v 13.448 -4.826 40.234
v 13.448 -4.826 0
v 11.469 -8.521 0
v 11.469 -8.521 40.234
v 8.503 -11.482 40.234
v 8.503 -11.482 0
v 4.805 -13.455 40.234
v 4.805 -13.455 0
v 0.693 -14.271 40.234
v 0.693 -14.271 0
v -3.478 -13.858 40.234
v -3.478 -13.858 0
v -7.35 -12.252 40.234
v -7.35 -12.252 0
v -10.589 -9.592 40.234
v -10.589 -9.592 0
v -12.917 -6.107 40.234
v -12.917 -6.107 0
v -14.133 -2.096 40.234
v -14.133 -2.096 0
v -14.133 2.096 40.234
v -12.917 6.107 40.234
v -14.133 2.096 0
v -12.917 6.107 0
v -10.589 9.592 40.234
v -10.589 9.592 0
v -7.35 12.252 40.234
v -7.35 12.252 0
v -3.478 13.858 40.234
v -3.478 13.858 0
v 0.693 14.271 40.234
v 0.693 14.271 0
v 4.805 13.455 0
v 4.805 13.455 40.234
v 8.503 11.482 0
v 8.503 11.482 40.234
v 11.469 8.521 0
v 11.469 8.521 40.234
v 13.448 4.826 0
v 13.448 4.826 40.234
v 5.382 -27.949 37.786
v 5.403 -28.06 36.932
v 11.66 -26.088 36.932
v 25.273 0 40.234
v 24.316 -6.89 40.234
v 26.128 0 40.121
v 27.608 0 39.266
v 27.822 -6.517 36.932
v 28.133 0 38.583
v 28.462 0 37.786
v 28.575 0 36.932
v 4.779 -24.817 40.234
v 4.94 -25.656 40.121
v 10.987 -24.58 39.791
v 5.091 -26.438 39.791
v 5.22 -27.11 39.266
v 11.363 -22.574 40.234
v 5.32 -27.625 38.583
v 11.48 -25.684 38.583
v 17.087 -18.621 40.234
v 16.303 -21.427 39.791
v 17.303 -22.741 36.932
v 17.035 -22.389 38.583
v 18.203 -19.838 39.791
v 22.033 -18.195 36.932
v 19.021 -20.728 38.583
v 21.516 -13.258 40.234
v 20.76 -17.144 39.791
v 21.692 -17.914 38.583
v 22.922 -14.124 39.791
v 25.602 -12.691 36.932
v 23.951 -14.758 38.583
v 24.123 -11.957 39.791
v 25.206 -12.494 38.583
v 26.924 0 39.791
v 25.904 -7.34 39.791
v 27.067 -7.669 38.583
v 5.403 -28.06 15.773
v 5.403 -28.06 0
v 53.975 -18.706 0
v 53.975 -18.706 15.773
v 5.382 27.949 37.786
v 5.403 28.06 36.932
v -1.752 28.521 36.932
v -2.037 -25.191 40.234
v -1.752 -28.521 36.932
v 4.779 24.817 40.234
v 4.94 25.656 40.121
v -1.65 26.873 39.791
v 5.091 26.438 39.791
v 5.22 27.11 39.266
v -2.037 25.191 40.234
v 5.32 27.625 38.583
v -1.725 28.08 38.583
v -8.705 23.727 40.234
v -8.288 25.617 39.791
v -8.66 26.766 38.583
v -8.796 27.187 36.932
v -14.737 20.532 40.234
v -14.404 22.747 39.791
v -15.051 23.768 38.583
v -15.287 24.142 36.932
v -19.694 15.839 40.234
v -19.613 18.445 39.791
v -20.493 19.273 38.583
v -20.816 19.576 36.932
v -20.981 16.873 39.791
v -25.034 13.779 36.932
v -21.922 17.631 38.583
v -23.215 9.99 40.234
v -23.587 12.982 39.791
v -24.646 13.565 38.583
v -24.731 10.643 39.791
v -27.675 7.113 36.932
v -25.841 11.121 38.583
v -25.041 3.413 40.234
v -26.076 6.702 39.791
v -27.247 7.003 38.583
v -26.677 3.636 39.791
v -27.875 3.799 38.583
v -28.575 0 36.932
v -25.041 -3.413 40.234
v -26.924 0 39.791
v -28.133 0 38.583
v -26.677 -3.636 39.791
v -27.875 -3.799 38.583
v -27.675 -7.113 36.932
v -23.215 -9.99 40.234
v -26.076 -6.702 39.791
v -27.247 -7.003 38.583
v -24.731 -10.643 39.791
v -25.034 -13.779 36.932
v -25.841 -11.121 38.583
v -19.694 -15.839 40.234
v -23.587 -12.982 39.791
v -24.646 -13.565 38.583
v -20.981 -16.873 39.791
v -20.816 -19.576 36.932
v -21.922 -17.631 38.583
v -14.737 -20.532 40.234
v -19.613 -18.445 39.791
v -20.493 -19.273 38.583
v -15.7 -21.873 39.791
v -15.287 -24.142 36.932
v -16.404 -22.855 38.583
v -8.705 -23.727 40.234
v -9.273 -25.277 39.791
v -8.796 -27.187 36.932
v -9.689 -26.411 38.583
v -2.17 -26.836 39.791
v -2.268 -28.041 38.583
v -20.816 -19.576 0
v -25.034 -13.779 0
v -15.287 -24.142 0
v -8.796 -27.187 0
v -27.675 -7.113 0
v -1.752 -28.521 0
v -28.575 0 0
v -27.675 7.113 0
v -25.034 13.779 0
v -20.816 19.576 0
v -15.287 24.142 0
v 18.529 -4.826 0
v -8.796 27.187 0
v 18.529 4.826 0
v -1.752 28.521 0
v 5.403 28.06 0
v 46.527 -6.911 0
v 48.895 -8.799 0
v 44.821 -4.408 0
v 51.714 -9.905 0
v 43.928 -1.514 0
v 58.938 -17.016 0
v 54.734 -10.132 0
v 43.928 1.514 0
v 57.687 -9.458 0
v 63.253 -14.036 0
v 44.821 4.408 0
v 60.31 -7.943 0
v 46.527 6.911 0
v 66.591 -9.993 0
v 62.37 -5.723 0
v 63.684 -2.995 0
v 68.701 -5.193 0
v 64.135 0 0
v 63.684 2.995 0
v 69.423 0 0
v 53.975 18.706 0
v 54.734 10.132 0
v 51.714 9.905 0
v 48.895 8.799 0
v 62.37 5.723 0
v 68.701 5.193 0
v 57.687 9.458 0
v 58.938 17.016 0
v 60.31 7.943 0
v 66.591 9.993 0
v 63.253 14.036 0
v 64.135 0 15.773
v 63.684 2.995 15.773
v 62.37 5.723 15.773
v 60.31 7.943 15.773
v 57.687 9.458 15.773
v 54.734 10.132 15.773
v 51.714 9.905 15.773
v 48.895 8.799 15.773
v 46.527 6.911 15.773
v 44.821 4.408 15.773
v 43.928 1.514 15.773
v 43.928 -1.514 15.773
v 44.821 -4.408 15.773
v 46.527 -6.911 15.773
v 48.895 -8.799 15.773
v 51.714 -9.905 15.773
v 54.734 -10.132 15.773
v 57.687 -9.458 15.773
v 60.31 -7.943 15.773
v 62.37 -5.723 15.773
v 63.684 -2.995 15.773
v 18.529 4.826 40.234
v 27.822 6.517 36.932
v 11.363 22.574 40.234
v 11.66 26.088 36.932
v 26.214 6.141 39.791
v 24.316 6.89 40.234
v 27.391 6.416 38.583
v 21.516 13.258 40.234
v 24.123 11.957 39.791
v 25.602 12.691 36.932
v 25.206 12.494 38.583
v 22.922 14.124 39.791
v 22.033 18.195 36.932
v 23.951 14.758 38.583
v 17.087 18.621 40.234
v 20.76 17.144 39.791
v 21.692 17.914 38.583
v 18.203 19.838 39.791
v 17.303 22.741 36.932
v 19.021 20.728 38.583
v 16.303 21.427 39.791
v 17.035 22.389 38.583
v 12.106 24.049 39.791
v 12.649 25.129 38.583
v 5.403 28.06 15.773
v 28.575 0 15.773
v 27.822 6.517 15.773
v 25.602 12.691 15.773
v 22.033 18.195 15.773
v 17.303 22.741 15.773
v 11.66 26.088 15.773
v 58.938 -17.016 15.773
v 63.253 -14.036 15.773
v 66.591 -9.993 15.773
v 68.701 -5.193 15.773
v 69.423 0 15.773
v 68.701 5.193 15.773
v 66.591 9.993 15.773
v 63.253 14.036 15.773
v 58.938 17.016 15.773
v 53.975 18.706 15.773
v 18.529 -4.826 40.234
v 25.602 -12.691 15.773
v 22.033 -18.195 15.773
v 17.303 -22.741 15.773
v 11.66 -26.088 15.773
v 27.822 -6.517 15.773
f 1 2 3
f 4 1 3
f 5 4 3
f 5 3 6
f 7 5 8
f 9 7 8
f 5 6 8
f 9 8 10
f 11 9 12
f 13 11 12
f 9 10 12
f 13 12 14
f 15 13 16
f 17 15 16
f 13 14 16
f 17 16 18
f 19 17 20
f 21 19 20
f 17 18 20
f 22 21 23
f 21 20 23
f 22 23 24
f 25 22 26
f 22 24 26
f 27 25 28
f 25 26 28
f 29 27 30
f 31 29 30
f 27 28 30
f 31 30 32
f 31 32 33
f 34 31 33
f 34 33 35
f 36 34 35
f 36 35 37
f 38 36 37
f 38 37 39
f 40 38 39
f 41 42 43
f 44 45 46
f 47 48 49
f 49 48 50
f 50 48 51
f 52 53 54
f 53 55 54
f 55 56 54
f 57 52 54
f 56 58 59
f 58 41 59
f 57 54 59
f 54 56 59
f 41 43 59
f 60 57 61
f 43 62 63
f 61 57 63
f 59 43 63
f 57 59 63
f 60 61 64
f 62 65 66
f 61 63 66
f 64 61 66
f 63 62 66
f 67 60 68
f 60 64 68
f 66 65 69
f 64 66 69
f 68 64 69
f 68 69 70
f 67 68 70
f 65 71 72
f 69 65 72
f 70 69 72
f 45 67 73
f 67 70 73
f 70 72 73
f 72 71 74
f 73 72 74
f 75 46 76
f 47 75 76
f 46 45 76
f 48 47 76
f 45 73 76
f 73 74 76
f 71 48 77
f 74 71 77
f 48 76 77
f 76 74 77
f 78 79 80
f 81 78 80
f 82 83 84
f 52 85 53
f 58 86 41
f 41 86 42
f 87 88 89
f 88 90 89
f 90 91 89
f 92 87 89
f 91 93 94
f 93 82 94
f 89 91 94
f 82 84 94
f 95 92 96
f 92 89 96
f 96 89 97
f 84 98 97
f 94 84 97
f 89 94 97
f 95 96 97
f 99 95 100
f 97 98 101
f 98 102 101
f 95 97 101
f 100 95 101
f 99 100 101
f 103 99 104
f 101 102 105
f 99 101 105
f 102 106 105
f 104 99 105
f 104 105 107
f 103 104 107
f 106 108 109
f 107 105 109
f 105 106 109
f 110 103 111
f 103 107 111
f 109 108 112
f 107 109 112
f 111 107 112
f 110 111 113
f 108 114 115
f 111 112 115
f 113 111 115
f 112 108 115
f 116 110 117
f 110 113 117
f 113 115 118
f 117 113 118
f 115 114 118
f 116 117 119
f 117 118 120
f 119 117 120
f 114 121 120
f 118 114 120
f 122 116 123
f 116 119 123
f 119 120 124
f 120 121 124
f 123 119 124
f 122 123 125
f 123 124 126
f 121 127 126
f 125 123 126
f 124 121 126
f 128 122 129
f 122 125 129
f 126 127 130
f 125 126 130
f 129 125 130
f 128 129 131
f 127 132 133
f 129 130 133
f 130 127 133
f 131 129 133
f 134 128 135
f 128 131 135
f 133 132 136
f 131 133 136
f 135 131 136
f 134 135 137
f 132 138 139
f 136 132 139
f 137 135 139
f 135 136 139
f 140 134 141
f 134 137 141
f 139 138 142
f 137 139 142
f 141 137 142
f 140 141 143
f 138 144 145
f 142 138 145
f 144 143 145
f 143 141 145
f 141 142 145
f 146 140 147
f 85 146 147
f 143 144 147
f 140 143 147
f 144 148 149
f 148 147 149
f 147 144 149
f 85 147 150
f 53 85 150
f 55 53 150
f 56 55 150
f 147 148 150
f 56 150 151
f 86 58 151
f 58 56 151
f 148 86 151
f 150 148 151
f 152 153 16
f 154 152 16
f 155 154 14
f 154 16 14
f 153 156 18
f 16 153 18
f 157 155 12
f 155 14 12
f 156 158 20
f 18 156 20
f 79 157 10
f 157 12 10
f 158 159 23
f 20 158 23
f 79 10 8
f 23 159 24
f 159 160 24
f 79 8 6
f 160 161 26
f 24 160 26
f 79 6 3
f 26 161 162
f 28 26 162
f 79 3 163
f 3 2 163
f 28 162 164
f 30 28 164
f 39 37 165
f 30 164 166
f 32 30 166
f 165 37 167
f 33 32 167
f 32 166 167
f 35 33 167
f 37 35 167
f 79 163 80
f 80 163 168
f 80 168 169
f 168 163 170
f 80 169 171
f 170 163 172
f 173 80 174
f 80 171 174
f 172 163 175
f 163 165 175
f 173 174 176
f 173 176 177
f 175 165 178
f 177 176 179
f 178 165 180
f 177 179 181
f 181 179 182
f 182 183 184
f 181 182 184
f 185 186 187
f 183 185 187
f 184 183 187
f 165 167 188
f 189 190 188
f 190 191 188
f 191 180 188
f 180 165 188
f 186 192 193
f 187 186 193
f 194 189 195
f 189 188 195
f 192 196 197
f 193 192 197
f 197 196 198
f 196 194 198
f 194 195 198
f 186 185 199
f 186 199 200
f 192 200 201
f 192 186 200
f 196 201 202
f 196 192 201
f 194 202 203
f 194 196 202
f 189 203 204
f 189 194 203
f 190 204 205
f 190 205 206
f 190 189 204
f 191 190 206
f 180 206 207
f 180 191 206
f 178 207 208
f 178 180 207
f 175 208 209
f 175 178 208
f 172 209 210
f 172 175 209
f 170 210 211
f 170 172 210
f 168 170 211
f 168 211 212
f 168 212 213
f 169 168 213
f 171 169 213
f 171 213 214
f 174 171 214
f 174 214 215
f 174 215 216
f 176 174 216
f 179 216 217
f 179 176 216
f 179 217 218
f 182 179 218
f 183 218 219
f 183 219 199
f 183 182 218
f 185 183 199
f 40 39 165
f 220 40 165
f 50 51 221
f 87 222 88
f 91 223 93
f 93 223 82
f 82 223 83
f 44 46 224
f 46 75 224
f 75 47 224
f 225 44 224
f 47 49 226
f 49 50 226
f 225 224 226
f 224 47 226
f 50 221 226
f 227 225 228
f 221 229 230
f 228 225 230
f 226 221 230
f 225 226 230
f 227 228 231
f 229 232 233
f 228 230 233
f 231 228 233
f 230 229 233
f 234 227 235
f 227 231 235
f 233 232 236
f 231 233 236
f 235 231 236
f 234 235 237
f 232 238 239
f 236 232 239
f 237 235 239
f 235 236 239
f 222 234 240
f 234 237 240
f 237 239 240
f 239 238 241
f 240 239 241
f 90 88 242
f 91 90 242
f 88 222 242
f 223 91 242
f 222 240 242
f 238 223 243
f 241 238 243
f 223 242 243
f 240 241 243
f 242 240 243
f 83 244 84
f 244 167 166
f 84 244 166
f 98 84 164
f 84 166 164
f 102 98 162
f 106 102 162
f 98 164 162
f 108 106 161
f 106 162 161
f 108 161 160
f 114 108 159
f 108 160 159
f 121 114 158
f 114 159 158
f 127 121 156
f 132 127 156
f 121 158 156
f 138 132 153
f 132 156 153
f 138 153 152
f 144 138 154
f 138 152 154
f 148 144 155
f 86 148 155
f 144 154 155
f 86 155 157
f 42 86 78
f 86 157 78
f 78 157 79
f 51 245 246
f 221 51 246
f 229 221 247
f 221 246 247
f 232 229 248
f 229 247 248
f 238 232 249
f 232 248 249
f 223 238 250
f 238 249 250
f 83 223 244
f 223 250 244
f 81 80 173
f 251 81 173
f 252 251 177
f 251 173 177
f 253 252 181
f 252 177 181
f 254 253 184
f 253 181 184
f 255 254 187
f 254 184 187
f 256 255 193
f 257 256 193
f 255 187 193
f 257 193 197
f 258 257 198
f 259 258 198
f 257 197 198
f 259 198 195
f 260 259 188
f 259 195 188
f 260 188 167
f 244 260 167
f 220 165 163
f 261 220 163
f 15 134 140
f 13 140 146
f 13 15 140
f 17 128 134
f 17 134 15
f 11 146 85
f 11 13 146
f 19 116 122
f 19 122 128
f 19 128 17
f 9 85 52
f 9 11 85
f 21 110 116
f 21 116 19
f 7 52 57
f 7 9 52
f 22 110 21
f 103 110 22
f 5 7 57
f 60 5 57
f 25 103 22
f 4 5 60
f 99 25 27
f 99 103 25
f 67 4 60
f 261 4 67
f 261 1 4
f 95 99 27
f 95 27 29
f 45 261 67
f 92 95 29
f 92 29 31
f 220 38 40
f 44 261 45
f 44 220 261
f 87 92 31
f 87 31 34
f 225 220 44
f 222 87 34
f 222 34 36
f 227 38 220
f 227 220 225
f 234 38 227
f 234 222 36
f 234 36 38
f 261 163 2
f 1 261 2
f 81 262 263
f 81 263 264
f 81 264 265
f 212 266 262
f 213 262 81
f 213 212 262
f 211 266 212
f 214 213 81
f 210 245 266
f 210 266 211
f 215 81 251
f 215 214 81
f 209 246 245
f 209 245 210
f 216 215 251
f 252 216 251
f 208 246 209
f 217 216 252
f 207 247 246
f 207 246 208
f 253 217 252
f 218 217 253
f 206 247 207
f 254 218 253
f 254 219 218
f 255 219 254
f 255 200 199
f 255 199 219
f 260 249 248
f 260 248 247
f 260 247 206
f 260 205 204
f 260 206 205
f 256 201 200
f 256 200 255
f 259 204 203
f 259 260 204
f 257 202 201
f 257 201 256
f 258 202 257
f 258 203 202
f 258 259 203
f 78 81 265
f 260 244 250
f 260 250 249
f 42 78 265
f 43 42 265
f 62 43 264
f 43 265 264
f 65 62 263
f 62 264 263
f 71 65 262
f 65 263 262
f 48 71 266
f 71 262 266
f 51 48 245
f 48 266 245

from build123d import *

# Parameters (mm, degrees)
F0_R     = 10.16
F1_DEPTH = 15.7734
F2_DEPTH = 40.2336
F3_R     = 3.302


with BuildPart() as f1:
    # F0 (on Top) → F1 (new body)
    with BuildSketch(Plane.XY):
        with BuildLine():
            ThreePointArc((5.403247, 28.0595), (22.033252, 18.195231), (28.575, 0))
            ThreePointArc((28.575, 0), (22.033252, -18.195231), (5.403247, -28.0595))
            Line((5.403247, -28.0595), (53.975, -18.706333))
            ThreePointArc((53.975, -18.706333), (69.422835, 0), (53.975, 18.706333))
            Line((53.975, 18.706333), (5.403247, 28.0595))
        make_face()
        with Locations((53.975, 0)):
            Circle(F0_R, mode=Mode.SUBTRACT)
    extrude(amount=F1_DEPTH)

    # F0 (on Top) → F2 (join)
    with BuildSketch(Plane.XY):
        with BuildLine():
            ThreePointArc((5.403247, -28.0595), (22.033252, -18.195231), (28.575, 0))
            ThreePointArc((28.575, 0), (22.033252, 18.195231), (5.403247, 28.0595))
            ThreePointArc((5.403247, 28.0595), (-28.575, 0), (5.403247, -28.0595))
        make_face()
        with BuildLine():
            ThreePointArc((13.447765, -4.826), (-14.2875, 0), (13.447765, 4.826))
            Line((13.447765, 4.826), (18.5293, 4.826))
            Line((18.5293, 4.826), (18.5293, 0))
            Line((18.5293, 0), (18.5293, -4.826))
            Line((18.5293, -4.826), (13.447765, -4.826))
        make_face(mode=Mode.SUBTRACT)
    extrude(amount=F2_DEPTH)

    # F3
    f3_edges = [f1.edges().sort_by_distance(p)[0] for p in [
        (-5.403247, 28.0595, 40.2336),
    ]]
    fillet(f3_edges, radius=F3_R)


solid = f1.part
